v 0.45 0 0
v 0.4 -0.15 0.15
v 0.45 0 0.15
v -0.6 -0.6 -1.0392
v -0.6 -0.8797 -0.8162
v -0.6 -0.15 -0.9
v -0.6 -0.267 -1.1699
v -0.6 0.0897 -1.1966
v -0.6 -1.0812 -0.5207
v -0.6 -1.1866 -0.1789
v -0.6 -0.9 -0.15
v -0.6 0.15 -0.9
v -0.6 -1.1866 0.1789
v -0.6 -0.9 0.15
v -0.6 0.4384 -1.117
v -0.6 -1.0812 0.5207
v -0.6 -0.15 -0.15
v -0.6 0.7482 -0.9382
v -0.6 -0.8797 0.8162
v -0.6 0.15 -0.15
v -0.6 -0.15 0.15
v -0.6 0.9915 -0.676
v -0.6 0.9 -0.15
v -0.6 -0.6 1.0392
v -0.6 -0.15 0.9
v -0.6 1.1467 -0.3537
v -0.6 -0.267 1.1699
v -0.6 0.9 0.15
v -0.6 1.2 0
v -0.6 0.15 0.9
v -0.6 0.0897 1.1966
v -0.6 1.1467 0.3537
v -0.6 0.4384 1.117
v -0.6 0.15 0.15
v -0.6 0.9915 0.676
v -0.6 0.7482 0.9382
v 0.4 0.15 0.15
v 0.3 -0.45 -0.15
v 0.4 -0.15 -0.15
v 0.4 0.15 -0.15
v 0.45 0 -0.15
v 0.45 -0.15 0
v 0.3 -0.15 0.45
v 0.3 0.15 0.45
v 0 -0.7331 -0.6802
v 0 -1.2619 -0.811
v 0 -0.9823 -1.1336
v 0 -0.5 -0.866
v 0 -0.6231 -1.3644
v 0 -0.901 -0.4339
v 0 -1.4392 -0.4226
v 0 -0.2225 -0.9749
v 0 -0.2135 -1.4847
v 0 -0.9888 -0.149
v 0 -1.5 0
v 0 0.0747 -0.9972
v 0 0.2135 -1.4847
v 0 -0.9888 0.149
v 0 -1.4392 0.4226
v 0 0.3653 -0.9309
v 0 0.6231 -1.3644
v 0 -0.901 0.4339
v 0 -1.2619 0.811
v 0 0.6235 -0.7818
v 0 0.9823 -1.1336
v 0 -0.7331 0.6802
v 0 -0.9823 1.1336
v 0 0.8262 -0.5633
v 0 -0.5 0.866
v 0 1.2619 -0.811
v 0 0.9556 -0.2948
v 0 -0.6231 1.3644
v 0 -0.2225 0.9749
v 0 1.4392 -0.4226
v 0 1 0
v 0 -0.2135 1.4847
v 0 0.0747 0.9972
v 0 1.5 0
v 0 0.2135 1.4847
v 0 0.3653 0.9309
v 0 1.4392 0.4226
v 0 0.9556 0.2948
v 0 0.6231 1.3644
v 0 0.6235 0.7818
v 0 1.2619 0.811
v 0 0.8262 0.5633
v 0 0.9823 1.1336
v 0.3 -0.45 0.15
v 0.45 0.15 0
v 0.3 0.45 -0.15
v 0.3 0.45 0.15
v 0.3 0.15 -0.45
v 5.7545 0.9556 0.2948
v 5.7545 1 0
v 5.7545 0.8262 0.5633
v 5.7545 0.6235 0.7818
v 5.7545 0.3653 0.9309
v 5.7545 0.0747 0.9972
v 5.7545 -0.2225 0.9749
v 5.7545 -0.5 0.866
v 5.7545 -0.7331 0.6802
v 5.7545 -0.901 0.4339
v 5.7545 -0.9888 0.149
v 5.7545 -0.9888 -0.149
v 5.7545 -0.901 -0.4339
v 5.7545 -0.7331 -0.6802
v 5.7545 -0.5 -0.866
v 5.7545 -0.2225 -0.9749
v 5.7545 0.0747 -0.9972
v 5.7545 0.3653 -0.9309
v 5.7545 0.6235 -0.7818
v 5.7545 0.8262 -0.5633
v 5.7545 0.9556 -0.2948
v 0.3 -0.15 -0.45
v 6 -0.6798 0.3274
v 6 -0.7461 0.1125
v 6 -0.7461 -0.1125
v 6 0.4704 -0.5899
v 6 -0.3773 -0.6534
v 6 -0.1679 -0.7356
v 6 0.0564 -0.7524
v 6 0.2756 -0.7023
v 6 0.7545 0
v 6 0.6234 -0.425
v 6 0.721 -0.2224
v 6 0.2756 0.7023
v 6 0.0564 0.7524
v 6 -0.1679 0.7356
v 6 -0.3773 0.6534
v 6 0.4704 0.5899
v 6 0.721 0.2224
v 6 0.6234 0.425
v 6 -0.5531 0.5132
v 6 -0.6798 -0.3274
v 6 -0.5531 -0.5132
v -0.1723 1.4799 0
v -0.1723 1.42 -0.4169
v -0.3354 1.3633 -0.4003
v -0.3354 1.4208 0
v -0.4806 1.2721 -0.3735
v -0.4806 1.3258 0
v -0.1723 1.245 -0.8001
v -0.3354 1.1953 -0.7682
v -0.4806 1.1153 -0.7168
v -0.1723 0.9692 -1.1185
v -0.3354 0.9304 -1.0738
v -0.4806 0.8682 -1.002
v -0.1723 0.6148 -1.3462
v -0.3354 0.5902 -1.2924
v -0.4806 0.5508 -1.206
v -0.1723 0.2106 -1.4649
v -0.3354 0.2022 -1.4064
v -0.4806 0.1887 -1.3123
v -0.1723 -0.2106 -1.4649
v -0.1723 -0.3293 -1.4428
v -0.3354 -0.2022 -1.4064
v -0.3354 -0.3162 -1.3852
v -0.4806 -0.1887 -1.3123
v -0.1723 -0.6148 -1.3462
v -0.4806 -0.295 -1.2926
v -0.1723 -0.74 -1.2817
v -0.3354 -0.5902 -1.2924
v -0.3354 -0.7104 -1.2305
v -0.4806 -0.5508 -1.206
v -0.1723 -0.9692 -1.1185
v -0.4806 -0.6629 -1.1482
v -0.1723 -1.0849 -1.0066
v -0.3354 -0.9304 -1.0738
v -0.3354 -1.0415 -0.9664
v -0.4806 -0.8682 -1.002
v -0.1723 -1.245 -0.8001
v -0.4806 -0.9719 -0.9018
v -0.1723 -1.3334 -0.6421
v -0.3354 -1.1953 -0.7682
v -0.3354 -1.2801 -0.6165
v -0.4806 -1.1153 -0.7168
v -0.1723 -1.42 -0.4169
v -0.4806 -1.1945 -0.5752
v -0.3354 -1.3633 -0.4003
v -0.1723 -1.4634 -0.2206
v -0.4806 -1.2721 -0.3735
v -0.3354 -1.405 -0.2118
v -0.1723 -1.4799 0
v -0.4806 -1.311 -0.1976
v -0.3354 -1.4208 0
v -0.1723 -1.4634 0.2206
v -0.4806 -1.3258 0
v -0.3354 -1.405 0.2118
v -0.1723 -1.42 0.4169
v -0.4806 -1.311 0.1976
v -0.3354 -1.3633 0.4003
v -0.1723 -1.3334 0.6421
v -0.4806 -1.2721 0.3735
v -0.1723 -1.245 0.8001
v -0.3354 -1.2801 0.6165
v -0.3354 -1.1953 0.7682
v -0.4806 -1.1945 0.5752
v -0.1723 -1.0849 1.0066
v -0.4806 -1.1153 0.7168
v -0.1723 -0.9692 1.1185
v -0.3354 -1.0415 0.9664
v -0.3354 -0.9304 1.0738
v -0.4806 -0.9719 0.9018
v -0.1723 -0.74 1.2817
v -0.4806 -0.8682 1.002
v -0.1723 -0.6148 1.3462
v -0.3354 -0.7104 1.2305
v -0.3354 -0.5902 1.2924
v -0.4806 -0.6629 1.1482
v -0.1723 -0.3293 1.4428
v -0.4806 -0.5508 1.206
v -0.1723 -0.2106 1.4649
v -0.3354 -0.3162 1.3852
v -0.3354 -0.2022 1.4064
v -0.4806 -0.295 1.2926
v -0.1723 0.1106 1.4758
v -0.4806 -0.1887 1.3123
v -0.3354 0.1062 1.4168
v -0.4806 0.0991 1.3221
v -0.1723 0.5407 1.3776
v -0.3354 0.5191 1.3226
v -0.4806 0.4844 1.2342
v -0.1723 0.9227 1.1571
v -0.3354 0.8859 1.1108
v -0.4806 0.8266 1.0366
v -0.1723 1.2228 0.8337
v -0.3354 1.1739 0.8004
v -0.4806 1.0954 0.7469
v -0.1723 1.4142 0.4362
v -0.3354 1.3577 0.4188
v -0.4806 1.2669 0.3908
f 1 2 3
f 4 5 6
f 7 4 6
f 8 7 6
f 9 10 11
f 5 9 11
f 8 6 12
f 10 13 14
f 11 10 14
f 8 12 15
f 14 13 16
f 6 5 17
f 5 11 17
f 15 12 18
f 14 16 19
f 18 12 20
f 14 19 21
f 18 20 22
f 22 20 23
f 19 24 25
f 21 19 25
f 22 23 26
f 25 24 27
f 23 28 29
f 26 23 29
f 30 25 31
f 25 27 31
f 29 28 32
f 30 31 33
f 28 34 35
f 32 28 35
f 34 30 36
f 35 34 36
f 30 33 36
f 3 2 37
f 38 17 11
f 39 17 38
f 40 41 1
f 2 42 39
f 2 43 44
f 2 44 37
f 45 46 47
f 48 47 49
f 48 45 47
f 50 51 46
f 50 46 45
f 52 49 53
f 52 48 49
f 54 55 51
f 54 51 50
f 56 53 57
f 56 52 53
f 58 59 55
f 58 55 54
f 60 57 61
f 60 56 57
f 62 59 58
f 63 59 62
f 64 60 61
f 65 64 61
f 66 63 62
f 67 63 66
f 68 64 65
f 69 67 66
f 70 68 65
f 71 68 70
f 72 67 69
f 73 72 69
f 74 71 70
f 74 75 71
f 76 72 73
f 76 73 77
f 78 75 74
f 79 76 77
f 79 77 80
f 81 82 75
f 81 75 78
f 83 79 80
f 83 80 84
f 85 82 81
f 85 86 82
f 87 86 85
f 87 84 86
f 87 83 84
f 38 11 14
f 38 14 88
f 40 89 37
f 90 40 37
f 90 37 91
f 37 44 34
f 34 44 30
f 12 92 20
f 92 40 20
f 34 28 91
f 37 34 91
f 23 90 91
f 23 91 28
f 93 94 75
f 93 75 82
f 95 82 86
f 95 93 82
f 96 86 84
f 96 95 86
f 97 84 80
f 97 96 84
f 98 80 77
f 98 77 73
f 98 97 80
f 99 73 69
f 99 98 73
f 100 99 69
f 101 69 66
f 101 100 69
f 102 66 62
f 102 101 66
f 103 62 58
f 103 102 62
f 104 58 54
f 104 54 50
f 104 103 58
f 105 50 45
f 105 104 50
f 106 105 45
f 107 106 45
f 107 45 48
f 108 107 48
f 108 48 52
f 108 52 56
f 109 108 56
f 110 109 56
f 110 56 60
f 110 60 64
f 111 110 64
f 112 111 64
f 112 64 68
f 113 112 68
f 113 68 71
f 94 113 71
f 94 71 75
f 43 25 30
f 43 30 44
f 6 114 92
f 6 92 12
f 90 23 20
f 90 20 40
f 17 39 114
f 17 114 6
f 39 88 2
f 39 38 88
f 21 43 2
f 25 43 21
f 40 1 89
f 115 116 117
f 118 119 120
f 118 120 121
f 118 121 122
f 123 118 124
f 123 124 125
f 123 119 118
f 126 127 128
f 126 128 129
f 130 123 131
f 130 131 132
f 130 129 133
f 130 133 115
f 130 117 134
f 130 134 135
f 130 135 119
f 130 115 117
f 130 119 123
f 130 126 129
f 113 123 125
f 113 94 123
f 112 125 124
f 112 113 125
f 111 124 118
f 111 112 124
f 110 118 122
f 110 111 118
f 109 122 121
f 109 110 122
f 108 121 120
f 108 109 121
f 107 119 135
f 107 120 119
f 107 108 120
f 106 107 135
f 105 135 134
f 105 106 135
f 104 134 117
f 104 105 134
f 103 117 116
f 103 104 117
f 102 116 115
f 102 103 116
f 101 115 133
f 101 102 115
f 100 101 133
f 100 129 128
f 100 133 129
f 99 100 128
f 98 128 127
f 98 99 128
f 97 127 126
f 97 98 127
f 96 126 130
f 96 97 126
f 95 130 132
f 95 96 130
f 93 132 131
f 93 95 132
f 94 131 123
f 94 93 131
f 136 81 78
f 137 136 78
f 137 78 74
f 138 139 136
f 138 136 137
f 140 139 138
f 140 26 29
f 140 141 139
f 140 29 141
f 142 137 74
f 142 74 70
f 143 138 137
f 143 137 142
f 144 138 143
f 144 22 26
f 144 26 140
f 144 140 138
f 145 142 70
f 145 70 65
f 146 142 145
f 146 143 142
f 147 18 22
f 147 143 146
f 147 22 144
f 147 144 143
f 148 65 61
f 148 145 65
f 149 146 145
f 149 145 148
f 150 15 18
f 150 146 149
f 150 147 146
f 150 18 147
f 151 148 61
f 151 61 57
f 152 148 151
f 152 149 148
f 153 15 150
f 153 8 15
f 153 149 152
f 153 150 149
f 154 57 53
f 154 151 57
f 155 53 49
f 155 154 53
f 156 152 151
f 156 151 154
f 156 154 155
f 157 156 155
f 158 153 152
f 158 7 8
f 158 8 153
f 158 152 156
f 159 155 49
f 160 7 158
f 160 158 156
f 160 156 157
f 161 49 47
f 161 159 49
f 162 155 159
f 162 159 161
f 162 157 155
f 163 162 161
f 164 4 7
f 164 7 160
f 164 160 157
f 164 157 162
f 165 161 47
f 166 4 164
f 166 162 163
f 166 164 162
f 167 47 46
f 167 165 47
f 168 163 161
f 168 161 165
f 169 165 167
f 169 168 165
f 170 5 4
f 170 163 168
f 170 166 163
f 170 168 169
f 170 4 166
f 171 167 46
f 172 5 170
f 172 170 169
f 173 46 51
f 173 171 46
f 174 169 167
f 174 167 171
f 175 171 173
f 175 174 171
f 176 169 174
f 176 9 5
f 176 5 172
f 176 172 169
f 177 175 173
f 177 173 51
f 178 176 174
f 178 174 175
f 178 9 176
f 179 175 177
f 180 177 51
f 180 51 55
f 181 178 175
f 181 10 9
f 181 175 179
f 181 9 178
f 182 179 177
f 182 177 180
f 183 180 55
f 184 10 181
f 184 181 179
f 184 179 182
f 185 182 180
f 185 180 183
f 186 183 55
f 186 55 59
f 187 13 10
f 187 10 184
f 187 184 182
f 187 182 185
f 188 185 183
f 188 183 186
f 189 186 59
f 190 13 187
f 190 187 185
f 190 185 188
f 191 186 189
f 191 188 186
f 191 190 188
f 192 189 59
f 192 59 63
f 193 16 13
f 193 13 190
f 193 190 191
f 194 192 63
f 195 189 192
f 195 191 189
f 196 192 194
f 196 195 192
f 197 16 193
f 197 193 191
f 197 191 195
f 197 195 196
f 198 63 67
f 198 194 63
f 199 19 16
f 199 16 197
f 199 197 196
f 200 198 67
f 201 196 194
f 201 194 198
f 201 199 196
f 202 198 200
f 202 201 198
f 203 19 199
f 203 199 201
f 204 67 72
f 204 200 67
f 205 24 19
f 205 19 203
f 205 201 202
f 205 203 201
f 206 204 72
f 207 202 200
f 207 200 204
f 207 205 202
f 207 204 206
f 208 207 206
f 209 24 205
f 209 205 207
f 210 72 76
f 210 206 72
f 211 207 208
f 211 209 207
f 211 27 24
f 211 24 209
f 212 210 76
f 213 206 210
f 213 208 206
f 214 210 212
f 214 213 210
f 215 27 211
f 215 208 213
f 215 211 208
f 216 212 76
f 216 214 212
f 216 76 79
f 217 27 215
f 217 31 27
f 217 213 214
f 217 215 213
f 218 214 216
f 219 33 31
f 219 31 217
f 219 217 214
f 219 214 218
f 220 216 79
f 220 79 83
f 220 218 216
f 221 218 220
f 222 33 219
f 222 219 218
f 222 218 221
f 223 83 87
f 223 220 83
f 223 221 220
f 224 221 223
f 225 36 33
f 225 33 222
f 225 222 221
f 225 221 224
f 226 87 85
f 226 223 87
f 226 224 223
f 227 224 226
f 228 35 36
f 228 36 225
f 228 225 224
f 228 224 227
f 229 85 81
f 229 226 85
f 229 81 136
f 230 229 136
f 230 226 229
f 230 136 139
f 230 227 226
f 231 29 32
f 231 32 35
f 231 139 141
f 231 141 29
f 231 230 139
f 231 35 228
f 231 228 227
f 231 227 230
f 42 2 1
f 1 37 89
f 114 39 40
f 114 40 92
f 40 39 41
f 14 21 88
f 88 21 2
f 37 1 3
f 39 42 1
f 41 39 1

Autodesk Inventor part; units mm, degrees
ref_plane "YZ Plane" through (0, 0, 0) normal (1, 0, 0) x (0, 1, 0)
ref_plane "XZ Plane" through (0, 0, 0) normal (0, 1, 0) x (-1, 0, 0)
ref_plane "XY Plane" through (0, 0, 0) normal (0, 0, 1) x (1, 0, 0)
sketch "Sketch_1" plane through (0, 0, 0) normal (0, 0, 1) x (1, 0, 0)
  line L0 (6, 0) -> (-0.6, 0)
  line L1 (-0.6, 0) -> (-0.6, 1.2)
  arc A0 (0, 1.5) -> (-0.6, 1.2) centre (0, 0.75) ccw
  line L2 (0, 1.5) -> (0, 1)
  line L3 (0, 1) -> (5.7545, 1)
  line L4 (5.7545, 1) -> (6, 0.7545)
  line L5 (6, 0.7545) -> (6, 0)
  line L6 (6, 0) -> (-0.6, 0)
revolve "Revolution1" add sketch "Sketch_1" angle 360 about axis through (6, 0, 0) along (1, 0, 0)
thread "Thread1" size "M2x0.4" class "6g" standard "ISO Metric profile" length 5.3293
sketch "Sketch_2" plane through (0, 0, 0) normal (0, 0, 1) x (1, 0, 0)
  line L0 (-0.6, -0.9) -> (0.3, -0.45)
  line L1 (0.3, -0.45) -> (0.45, 0)
  line L2 (0.45, 0) -> (0.3, 0.45)
  line L3 (0.3, 0.45) -> (-0.6, 0.9)
  line L4 (-0.6, 0.9) -> (-0.6, -0.9)
extrude "Extrusion1" cut sketch "Sketch_2" along normal mid plane 0.3
sketch "Sketch_3" plane through (0, 0, 0) normal (0, 1, 0) x (-1, 0, 0)
  line L0 (0.6, 0.9) -> (-0.3, 0.45)
  line L1 (-0.3, 0.45) -> (-0.45, 0)
  line L2 (-0.45, 0) -> (-0.3, -0.45)
  line L3 (-0.3, -0.45) -> (0.6, -0.9)
  line L4 (0.6, -0.9) -> (0.6, 0.9)
extrude "Extrusion2" cut sketch "Sketch_3" along normal mid plane 0.3
properties part number "SNZS-M2-6"
